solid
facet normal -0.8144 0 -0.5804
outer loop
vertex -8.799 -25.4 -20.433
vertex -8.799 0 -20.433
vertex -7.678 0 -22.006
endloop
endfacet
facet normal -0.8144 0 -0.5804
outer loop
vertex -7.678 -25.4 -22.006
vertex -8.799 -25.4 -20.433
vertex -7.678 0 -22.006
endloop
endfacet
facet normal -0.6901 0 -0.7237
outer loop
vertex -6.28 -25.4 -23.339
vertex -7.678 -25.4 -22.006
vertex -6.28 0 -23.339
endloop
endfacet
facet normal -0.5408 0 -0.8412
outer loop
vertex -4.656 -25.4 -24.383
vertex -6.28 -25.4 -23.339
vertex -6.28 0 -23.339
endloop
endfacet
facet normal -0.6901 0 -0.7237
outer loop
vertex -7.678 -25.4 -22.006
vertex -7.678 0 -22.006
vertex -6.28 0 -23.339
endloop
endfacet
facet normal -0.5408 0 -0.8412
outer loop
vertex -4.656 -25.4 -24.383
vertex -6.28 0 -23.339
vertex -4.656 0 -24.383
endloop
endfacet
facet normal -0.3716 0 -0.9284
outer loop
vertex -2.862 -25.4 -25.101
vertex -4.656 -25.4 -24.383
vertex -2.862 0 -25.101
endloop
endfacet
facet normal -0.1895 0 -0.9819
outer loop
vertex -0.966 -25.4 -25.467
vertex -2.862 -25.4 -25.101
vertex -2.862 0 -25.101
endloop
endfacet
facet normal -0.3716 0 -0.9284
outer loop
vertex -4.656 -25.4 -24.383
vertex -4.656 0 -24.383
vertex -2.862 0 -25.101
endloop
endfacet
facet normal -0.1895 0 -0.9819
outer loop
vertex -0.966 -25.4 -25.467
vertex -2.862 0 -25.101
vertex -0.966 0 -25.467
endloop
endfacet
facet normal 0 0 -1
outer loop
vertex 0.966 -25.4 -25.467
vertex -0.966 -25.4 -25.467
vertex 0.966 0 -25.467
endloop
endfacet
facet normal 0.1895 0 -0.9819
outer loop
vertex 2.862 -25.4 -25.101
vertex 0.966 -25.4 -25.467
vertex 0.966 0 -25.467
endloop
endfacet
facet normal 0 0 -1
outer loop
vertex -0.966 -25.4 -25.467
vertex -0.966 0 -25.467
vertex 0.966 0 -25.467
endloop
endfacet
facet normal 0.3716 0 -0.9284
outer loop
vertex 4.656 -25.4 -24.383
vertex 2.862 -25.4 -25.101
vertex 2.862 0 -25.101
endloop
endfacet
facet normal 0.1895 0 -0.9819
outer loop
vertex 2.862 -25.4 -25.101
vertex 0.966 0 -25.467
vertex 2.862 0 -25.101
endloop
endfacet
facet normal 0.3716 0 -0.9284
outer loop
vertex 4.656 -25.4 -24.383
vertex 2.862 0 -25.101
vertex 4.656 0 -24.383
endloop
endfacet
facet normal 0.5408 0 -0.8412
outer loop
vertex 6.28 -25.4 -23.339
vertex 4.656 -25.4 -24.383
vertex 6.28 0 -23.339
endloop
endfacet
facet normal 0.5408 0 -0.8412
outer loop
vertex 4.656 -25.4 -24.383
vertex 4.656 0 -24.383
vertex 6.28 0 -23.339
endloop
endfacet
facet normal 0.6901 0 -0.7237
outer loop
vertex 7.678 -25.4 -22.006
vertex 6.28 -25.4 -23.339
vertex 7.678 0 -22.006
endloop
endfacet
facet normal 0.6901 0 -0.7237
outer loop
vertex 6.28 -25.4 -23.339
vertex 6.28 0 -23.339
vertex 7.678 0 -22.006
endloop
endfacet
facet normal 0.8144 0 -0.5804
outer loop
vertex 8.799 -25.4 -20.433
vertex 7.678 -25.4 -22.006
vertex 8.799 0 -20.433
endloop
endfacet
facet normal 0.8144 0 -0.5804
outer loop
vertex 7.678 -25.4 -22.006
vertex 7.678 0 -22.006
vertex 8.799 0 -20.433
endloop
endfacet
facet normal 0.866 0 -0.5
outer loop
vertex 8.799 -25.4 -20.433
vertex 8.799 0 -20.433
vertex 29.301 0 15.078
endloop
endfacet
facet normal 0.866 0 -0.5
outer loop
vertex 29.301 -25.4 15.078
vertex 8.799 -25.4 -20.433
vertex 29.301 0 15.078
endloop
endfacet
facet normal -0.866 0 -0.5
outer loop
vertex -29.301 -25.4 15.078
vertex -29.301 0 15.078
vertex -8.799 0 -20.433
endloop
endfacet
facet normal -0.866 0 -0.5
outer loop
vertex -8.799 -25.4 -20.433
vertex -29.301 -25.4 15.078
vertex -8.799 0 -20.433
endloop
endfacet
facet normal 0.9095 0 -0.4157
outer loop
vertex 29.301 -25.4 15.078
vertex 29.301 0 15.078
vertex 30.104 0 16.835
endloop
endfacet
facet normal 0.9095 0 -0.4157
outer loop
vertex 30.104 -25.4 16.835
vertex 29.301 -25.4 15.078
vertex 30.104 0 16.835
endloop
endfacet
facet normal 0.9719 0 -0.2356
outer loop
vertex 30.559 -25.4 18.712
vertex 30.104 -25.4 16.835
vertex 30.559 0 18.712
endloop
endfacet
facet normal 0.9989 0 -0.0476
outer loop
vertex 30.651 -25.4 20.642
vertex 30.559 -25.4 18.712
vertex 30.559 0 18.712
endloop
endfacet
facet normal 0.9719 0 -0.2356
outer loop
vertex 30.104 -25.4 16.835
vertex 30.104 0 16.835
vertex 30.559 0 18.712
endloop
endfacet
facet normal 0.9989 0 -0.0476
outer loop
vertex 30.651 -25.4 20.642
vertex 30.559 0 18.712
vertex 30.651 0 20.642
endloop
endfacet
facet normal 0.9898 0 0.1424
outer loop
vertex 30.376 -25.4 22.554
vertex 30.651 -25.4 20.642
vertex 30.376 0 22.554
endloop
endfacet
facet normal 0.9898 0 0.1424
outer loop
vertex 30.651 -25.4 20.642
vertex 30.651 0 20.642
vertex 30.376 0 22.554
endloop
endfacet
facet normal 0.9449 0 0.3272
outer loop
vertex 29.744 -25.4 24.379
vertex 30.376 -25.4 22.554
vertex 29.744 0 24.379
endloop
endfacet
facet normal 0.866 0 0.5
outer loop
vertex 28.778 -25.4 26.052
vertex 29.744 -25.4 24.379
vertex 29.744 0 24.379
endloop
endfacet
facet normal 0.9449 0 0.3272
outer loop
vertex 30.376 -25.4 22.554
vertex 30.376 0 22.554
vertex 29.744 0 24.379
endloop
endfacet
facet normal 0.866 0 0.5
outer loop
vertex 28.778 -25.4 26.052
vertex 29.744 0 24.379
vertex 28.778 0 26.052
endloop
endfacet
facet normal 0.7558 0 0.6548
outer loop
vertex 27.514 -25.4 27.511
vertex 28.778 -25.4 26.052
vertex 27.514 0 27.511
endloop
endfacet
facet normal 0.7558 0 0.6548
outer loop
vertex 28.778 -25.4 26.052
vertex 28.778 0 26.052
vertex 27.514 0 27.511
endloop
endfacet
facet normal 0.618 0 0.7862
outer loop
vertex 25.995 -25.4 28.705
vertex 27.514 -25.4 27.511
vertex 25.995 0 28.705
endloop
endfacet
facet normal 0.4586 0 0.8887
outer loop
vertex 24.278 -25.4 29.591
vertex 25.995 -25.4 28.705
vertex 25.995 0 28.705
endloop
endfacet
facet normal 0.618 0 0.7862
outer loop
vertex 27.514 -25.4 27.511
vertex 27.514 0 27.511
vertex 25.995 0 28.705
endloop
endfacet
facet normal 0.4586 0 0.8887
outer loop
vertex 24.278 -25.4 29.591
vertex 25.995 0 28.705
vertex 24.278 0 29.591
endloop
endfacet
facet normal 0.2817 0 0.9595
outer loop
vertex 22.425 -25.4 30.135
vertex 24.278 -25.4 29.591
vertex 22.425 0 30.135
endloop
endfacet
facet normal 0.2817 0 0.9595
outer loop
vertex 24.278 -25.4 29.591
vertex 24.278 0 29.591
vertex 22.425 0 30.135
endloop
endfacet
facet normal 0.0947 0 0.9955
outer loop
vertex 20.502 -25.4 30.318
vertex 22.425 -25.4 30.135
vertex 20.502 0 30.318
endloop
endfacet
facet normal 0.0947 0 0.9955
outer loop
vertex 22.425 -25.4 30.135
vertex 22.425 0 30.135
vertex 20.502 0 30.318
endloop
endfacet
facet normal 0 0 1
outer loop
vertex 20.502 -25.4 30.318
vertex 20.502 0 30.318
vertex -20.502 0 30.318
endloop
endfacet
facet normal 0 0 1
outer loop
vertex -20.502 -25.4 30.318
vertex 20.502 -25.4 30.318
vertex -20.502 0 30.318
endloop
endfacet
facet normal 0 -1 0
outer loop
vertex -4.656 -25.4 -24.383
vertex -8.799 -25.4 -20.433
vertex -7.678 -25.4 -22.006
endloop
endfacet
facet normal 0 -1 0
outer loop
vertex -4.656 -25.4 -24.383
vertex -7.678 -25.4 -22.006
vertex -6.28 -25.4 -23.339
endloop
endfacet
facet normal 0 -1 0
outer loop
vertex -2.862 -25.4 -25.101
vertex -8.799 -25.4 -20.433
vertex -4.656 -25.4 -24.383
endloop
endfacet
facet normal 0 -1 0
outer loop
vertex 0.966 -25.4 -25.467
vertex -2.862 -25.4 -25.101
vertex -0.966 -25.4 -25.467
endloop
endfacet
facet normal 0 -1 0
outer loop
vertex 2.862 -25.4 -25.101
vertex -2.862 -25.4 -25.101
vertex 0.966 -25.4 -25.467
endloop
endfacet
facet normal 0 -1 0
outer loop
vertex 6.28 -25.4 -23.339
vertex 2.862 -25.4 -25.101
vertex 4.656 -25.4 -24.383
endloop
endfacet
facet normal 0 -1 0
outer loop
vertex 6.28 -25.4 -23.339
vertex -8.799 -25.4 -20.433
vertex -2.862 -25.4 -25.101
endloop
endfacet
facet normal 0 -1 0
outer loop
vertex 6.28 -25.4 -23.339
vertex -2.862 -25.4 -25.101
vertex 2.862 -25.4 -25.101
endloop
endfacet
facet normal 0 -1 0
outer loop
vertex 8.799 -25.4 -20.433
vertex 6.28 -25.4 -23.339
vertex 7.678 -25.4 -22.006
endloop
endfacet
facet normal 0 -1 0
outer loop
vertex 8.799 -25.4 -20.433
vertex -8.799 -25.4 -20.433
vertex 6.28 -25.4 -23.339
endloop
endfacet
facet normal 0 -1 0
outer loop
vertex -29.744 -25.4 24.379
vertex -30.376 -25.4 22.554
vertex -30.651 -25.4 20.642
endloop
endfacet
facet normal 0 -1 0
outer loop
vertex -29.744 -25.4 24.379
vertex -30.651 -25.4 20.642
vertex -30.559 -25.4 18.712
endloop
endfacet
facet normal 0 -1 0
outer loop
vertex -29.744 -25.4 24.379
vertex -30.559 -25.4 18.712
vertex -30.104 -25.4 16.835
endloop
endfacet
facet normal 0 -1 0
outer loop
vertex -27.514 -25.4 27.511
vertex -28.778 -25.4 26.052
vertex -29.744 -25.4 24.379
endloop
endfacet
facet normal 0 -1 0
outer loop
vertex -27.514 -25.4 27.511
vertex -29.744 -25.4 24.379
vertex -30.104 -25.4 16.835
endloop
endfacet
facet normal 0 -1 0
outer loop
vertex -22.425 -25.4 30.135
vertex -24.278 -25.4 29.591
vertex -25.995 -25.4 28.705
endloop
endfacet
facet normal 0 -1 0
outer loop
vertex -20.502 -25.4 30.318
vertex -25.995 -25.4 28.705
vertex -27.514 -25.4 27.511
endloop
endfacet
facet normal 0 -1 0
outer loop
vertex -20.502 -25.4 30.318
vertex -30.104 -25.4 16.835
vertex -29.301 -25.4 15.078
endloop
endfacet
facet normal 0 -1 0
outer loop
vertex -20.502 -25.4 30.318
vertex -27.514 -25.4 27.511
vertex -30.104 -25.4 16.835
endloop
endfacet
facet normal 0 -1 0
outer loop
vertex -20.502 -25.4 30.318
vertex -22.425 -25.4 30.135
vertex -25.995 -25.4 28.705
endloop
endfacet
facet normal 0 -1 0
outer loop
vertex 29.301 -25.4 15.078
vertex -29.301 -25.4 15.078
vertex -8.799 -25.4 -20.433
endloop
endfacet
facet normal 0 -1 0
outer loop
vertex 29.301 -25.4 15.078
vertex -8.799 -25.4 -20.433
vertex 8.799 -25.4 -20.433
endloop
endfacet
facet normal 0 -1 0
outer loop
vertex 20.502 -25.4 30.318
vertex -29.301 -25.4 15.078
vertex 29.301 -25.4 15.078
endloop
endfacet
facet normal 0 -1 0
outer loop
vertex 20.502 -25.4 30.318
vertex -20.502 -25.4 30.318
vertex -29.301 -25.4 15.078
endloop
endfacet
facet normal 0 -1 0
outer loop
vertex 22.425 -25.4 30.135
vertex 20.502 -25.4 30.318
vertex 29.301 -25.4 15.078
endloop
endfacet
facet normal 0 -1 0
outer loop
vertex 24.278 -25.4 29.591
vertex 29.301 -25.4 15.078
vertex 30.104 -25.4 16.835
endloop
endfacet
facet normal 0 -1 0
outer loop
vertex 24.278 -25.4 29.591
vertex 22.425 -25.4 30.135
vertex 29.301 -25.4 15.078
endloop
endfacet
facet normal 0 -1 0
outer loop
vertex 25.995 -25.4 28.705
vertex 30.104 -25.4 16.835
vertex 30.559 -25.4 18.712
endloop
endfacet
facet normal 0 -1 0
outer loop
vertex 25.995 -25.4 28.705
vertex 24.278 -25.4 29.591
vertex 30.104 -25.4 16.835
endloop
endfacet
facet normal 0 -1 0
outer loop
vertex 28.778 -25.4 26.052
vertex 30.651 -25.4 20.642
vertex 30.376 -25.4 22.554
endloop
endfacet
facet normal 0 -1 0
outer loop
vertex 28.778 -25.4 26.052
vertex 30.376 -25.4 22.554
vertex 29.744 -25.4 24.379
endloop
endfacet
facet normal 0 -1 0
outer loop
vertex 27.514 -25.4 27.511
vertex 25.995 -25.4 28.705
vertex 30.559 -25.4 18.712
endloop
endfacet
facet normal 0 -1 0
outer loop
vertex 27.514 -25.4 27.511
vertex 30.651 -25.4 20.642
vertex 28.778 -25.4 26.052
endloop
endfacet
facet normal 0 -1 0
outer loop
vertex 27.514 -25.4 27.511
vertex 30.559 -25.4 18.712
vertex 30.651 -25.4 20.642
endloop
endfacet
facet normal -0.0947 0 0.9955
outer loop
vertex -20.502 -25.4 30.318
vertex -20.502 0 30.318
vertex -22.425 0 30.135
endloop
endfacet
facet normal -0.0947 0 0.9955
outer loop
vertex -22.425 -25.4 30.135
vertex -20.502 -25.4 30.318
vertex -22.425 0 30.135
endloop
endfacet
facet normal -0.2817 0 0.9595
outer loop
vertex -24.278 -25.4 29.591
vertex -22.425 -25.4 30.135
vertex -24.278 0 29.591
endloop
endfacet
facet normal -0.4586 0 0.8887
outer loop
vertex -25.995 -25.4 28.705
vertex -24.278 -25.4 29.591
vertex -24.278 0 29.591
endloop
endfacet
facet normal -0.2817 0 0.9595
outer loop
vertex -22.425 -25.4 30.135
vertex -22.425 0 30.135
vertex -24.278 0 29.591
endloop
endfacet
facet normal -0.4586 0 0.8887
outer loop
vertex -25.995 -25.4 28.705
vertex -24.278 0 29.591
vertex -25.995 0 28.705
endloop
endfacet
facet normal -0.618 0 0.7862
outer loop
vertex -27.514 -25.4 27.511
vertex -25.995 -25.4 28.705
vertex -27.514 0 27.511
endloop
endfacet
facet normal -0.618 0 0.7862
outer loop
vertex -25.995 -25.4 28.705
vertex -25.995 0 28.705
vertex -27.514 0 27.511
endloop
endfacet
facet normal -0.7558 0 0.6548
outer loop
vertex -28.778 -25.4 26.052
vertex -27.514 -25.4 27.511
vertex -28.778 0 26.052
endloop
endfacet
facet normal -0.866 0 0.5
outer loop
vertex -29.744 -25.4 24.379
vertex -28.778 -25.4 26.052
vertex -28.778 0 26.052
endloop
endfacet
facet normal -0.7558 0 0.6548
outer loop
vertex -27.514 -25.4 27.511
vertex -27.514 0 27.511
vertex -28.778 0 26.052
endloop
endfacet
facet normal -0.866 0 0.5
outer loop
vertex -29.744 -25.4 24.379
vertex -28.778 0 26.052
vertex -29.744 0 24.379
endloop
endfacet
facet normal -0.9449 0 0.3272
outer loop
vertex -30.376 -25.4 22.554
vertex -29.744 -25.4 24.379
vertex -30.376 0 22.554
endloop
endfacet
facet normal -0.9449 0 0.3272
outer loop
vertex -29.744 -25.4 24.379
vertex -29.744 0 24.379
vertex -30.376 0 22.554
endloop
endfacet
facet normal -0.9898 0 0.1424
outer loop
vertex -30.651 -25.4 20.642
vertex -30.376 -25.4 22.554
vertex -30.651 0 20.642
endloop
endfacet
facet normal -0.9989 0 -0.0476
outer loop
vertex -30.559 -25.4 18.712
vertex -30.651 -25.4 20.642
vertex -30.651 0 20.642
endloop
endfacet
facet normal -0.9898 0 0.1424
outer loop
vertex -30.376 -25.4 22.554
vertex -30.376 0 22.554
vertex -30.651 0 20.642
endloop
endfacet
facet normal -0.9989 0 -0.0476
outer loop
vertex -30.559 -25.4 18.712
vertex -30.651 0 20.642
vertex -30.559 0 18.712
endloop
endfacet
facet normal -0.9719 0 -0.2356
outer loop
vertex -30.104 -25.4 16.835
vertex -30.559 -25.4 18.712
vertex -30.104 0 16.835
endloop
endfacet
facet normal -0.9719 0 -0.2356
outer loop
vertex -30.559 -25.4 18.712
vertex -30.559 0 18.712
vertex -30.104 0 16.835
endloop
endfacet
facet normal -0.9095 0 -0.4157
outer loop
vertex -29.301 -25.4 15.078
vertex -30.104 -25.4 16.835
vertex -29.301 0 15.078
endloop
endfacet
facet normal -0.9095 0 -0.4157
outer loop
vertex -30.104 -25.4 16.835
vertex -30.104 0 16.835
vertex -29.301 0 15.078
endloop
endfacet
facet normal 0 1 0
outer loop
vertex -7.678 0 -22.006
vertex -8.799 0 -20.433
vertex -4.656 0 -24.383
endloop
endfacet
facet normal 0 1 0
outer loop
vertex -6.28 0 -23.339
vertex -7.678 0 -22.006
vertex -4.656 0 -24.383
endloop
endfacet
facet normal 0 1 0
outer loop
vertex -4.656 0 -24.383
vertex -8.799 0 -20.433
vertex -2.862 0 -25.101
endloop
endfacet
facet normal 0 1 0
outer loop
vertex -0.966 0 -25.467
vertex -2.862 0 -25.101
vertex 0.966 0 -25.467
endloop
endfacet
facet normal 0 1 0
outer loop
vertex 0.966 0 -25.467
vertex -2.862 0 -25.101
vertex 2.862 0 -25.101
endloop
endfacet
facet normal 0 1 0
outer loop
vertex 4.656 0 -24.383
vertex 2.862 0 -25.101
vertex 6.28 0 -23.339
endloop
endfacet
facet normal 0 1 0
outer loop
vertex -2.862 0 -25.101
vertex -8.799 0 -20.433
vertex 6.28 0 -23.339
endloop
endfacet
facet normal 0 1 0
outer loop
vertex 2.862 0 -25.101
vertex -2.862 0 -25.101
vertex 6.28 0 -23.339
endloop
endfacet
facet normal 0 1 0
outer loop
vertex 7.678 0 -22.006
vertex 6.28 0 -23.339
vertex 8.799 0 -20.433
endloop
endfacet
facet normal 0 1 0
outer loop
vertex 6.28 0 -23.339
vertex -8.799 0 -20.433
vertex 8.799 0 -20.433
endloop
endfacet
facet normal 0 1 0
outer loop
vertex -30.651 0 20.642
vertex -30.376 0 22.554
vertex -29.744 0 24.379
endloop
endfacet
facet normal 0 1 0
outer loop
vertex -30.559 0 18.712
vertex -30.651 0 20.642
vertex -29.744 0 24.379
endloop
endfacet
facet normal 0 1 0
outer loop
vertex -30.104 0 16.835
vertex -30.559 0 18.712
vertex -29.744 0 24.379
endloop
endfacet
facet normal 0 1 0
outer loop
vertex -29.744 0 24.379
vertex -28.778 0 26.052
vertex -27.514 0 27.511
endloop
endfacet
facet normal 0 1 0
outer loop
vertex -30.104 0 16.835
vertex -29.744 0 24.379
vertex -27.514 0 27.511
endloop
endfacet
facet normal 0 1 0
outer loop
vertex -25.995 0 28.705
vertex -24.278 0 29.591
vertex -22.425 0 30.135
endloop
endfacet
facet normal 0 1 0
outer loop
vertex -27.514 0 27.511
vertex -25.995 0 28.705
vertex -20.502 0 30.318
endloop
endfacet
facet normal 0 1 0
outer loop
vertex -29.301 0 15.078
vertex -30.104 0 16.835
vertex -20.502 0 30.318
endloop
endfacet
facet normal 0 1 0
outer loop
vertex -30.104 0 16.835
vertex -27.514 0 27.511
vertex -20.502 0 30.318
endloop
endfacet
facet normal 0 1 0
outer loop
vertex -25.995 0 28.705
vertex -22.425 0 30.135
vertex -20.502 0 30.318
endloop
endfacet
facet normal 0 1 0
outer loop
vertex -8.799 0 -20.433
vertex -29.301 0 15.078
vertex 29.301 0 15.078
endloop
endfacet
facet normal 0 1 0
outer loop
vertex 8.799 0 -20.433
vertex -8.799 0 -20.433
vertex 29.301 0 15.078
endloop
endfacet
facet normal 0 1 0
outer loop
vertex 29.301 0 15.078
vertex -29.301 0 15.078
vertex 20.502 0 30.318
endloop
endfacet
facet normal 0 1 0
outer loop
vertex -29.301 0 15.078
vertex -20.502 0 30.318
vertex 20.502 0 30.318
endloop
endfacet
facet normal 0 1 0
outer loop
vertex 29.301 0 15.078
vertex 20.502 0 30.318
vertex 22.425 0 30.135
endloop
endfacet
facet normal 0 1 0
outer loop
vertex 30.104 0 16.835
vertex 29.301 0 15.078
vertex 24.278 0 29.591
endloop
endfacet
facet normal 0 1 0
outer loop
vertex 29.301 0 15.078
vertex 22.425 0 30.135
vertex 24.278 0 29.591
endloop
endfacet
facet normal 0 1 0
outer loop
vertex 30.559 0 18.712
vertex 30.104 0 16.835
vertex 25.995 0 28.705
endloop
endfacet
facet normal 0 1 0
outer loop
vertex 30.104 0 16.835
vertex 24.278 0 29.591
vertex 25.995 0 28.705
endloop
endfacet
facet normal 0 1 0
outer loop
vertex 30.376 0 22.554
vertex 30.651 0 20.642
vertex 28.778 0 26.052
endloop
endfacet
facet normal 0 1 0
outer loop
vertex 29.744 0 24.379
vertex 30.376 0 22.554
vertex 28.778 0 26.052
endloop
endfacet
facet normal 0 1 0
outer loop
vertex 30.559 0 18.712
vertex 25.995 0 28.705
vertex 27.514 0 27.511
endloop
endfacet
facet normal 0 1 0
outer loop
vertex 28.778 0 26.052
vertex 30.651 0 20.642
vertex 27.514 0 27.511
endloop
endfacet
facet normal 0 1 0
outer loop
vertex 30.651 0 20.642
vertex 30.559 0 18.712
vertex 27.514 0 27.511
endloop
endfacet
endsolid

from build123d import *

# Parameters (mm, degrees)
F1_DEPTH = 25.4


with BuildPart() as f1:
    # F0 (on Front) → F1 (new body)
    with BuildSketch(Plane.XZ):
        with BuildLine():
            Line((-29.301182, 15.078336), (-8.798818, -20.4328))
            ThreePointArc((-8.798818, -20.4328), (0, -25.5128), (8.798818, -20.4328))
            Line((8.798818, -20.4328), (29.301182, 15.078336))
            ThreePointArc((29.301182, 15.078336), (29.301182, 25.238336), (20.502364, 30.318336))
            Line((20.502364, 30.318336), (-20.502364, 30.318336))
            ThreePointArc((-20.502364, 30.318336), (-29.301182, 25.238336), (-29.301182, 15.078336))
        make_face()
    extrude(amount=F1_DEPTH)


solid = f1.part
